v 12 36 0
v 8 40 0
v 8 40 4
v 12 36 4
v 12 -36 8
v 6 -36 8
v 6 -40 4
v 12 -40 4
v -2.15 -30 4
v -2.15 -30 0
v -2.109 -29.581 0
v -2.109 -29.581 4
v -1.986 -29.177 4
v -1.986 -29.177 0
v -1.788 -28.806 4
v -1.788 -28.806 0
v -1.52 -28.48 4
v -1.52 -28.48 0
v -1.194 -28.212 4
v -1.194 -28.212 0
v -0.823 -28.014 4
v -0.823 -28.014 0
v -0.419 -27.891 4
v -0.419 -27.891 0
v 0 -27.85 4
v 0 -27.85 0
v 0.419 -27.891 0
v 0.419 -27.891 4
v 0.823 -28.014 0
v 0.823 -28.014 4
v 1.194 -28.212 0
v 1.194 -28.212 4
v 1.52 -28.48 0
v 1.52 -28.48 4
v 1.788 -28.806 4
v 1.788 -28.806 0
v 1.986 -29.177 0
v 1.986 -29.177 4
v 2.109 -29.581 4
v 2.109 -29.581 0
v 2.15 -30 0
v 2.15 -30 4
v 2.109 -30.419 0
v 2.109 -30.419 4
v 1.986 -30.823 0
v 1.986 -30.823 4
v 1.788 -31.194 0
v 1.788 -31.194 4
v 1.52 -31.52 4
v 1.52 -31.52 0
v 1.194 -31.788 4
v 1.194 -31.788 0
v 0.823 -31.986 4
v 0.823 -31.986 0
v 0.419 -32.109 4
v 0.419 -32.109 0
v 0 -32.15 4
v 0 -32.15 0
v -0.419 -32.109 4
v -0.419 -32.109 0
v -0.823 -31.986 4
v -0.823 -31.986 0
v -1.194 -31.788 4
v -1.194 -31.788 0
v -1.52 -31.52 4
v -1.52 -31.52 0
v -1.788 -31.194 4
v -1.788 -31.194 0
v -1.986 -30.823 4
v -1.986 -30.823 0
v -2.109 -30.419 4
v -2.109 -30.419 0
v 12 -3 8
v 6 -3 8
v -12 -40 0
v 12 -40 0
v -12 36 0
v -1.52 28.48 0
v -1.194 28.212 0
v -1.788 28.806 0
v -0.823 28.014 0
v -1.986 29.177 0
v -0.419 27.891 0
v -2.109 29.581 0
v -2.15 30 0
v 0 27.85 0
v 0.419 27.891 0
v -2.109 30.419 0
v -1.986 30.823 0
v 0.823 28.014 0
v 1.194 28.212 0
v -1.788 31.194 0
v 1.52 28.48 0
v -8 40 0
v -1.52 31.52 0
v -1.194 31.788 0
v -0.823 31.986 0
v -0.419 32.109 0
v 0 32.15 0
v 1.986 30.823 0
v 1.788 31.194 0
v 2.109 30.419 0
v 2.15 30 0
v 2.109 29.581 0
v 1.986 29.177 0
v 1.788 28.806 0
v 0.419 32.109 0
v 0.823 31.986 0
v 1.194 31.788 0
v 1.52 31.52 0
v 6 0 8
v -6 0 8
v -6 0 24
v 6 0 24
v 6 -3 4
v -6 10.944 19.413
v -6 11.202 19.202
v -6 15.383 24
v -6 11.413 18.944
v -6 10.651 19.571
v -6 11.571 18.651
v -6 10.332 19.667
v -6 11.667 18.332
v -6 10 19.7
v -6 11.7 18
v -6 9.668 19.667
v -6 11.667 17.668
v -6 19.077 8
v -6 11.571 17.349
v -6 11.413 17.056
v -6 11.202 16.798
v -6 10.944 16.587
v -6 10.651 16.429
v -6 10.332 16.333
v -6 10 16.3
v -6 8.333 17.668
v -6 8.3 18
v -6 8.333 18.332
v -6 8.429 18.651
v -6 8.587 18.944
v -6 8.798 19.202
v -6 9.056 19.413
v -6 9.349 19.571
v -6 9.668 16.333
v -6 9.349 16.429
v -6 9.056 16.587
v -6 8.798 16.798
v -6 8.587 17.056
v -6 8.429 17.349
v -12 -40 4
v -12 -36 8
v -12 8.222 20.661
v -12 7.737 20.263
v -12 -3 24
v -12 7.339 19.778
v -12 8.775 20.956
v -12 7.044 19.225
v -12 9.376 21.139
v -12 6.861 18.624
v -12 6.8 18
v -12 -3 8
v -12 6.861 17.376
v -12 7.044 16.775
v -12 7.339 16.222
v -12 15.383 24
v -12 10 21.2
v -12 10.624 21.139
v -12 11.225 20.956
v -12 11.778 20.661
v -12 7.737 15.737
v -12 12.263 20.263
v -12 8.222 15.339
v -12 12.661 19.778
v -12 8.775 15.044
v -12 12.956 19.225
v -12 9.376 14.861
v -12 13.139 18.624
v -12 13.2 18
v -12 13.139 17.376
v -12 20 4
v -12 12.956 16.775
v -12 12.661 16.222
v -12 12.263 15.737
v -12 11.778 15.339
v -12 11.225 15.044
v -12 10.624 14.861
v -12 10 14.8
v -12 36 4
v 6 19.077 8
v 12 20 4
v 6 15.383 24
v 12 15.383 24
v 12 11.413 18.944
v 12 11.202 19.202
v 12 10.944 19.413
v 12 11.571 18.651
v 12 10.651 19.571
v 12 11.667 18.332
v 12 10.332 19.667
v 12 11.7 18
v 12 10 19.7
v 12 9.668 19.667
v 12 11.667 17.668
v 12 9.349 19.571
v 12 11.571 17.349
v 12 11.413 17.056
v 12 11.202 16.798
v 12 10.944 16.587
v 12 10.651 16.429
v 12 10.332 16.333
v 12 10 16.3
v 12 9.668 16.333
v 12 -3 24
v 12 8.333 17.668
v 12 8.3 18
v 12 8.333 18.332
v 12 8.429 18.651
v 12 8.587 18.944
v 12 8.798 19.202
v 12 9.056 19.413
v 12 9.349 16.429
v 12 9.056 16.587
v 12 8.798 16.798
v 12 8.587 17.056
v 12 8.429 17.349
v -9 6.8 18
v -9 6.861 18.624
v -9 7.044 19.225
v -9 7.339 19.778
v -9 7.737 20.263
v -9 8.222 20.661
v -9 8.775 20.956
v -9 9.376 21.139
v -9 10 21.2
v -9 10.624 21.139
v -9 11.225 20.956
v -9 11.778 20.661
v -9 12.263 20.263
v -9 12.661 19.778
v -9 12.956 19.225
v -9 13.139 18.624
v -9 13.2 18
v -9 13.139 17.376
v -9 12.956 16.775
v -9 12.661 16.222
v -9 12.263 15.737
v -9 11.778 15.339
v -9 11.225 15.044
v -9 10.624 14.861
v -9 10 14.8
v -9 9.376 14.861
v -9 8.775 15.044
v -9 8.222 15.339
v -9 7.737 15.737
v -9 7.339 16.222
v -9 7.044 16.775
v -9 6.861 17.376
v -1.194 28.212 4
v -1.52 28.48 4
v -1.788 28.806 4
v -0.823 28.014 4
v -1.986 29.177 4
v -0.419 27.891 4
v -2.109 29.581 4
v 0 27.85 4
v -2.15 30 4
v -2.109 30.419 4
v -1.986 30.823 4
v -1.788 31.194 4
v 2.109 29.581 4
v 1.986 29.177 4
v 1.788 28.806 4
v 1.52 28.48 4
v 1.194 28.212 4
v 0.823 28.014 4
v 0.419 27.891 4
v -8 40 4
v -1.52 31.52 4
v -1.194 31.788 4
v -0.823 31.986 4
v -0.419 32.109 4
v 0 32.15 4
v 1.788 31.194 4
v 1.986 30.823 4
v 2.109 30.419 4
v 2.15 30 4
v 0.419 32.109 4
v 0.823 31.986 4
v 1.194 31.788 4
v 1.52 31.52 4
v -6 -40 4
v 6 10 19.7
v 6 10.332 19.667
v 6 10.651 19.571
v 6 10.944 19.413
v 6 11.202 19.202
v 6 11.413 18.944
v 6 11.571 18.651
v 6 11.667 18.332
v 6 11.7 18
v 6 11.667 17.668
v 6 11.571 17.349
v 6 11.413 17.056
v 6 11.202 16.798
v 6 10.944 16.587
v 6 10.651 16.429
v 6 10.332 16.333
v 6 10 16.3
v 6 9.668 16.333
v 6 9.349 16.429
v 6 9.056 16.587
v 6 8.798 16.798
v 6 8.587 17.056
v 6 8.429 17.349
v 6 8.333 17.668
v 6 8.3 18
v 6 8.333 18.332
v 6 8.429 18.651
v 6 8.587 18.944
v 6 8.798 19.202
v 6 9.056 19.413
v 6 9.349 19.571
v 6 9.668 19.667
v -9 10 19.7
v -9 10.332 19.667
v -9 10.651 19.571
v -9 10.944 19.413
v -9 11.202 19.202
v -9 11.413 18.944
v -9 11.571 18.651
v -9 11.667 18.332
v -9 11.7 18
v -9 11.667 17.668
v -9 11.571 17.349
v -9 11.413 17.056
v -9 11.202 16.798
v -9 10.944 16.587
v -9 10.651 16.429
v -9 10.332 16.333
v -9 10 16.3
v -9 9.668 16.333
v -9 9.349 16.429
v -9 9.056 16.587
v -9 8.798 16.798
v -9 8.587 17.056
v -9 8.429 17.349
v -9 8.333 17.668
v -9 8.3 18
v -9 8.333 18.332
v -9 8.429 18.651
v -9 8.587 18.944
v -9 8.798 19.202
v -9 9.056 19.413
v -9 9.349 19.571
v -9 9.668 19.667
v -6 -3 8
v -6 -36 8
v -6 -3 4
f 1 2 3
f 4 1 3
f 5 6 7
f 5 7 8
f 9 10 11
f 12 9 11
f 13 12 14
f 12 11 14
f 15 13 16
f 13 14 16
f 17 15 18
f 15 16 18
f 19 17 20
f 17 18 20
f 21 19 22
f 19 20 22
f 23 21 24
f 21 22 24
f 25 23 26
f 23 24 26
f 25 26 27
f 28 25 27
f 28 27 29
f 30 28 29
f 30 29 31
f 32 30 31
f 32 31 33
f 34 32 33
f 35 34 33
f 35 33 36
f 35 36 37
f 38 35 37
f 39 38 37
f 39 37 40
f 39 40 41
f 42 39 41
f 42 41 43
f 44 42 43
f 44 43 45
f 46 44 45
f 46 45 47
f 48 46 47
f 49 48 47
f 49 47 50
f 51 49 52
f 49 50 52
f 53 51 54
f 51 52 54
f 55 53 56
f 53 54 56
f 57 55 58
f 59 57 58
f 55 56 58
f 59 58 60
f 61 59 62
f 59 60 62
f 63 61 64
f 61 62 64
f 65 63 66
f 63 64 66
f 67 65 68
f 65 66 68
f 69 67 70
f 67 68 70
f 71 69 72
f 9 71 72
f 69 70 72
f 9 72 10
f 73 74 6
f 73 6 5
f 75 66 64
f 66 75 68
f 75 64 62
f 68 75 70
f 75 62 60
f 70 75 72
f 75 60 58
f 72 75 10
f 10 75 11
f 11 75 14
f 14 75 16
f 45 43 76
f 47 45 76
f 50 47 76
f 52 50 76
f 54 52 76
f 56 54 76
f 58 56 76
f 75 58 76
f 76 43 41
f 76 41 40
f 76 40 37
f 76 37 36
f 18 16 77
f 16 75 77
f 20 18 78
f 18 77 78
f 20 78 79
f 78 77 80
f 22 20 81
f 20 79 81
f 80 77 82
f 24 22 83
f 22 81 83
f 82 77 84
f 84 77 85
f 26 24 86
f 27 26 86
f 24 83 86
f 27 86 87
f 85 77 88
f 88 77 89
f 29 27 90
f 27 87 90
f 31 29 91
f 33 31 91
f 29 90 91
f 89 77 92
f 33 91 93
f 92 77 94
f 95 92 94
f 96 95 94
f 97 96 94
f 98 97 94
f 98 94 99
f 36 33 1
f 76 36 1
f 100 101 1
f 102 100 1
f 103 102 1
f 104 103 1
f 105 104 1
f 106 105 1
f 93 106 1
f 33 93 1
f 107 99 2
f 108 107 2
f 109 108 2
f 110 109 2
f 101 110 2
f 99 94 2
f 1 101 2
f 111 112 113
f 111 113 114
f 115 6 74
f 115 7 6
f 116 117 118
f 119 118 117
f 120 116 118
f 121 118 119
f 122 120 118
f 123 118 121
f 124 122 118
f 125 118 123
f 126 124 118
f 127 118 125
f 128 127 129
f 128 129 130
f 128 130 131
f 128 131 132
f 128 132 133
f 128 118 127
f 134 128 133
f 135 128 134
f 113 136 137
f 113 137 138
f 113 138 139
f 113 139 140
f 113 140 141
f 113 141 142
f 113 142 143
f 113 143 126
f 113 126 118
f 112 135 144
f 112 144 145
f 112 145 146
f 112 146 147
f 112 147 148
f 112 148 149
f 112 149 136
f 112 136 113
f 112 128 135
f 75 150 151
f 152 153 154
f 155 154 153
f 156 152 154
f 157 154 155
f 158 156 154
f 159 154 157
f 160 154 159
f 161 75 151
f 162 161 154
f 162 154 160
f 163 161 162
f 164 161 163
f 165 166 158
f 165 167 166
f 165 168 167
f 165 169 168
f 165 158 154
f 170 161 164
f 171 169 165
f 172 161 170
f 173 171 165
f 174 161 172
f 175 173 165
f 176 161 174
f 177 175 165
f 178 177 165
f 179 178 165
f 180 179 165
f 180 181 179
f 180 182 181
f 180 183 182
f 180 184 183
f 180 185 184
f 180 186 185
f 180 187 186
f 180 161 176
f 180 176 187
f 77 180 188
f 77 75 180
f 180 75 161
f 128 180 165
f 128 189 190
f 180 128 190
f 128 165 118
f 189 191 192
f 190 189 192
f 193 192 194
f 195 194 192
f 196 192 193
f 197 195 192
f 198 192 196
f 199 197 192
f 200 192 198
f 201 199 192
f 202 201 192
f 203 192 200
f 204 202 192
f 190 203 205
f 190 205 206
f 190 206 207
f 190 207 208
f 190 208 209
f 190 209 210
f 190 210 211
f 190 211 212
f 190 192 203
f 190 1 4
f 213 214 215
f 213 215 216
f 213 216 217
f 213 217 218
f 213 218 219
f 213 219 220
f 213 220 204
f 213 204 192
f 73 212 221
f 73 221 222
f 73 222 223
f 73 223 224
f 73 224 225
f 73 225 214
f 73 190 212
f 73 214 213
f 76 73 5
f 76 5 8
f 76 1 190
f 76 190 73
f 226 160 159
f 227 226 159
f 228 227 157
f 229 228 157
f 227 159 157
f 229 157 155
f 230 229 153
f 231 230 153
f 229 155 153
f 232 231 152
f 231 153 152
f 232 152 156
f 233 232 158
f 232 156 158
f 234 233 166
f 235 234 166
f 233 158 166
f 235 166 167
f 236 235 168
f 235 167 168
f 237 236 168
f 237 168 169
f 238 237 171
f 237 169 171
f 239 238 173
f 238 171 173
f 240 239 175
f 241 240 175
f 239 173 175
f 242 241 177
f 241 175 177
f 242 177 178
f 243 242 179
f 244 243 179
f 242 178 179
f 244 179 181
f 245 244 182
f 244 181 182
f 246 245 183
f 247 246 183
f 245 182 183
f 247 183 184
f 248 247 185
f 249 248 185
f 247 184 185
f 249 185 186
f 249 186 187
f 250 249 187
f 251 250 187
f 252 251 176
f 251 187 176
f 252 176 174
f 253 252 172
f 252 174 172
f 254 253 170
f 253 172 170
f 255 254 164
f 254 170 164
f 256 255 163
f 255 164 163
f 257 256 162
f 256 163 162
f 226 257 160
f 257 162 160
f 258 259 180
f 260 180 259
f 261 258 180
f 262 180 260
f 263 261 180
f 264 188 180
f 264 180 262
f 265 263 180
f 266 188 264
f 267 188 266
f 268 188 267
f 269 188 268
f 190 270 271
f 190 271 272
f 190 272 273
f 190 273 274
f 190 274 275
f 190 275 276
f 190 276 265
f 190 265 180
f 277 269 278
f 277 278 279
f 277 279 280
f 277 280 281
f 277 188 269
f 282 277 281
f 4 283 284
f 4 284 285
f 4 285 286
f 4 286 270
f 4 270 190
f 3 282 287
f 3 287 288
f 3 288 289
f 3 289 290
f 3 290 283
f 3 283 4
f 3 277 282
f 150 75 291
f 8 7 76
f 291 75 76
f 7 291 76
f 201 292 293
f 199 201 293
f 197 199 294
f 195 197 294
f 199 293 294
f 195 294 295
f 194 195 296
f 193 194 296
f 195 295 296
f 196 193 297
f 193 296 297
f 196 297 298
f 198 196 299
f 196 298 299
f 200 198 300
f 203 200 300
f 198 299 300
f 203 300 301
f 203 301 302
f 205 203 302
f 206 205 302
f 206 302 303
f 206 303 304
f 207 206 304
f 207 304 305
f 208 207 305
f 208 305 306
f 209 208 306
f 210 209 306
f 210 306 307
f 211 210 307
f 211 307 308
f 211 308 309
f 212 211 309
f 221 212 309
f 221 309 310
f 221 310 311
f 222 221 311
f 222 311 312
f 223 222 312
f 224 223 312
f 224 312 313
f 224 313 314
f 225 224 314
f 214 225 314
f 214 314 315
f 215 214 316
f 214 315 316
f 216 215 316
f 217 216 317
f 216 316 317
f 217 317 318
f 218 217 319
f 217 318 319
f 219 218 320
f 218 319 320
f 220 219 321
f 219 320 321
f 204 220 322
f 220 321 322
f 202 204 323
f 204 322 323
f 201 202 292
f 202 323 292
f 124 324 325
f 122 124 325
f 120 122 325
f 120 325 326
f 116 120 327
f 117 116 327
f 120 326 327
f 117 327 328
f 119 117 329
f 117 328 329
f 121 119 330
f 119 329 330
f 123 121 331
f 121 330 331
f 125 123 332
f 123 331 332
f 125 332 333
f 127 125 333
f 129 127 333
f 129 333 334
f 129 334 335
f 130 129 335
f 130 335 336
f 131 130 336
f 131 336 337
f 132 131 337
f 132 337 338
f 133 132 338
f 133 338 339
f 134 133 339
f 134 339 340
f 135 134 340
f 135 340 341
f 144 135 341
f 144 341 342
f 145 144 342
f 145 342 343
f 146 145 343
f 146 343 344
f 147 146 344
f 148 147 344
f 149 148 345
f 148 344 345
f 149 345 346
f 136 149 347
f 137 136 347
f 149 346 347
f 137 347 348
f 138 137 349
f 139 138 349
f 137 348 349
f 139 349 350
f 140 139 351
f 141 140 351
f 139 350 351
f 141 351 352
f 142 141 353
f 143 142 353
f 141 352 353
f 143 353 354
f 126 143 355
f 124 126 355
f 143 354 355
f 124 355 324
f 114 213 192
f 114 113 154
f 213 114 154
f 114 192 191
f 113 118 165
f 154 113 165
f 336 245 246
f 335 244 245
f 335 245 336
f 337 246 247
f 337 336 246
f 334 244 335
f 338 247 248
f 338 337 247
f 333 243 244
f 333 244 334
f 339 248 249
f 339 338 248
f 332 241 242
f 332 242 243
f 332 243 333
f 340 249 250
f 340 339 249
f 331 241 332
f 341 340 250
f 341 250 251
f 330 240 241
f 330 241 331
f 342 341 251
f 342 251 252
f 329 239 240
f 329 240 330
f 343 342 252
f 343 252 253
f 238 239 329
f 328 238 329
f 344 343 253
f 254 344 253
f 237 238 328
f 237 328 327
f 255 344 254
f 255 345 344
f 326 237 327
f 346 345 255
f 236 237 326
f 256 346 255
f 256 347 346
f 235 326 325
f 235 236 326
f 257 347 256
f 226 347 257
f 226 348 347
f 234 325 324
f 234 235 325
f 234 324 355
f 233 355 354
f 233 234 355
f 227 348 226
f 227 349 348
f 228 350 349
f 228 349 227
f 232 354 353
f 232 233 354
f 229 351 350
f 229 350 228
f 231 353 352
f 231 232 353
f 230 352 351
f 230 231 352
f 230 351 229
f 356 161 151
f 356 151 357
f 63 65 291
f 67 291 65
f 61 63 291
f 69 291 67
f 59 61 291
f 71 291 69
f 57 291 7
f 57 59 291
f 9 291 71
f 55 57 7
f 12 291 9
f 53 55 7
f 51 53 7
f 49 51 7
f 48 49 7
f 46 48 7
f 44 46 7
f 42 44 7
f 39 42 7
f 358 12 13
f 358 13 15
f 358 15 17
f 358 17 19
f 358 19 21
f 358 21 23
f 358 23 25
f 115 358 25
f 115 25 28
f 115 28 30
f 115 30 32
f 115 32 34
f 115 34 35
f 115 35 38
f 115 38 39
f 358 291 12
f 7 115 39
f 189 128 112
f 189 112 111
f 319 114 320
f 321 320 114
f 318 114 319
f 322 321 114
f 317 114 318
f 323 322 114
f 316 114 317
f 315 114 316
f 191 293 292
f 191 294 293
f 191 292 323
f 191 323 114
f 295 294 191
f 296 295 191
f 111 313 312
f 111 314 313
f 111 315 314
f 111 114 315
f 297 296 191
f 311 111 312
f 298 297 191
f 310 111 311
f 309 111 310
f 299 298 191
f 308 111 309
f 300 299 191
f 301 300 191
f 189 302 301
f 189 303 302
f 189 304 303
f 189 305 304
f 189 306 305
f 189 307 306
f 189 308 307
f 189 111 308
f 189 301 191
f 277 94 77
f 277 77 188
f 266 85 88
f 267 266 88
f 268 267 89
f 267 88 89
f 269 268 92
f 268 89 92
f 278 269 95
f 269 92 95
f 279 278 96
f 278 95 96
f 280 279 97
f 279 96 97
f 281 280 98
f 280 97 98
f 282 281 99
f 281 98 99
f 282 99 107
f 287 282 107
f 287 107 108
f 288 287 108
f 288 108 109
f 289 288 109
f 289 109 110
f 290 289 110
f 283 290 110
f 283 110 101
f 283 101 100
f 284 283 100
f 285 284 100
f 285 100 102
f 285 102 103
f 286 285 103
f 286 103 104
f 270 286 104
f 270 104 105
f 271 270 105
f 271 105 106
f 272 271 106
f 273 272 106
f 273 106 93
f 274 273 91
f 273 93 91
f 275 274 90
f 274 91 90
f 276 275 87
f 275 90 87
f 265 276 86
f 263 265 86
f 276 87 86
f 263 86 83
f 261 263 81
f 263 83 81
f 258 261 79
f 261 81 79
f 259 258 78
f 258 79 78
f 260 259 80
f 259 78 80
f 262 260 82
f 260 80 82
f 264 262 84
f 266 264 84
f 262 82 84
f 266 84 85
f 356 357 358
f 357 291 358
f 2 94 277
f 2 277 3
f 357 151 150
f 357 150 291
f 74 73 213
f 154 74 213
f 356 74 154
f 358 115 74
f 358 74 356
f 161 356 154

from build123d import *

# Parameters (mm, degrees)
ESQUISSE1_W             = 24
ESQUISSE1_H             = 80
BOSS_EXTRU_1_DEPTH      = 4
ESQUISSE2_W             = 24
ESQUISSE2_H             = 23
BOSS_EXTRU_2_DEPTH      = 4
BOSS_EXTRU_3_DEPTH      = 16
ESQUISSE4_W             = 6
ESQUISSE4_H             = 37
BOSS_EXTRU_4_DEPTH      = 4
CHANFREIN1_SIZE         = 4
CHANFREIN2_SIZE2        = 4.617363823
CHANFREIN2_SIZE         = 20
D_GAGEMENT_M31_D        = 3.4
D_GAGEMENT_M42_D        = 4.3
ESQUISSE11_R            = 3.2
ENL_V_MAT_EXTRU_1_DEPTH = 3


with BuildPart() as part:
    # Esquisse1 → Boss.-Extru.1 (new body)
    with BuildSketch(Plane.XY):
        Rectangle(ESQUISSE1_W, ESQUISSE1_H)
    extrude(amount=BOSS_EXTRU_1_DEPTH)

    # Esquisse2 → Boss.-Extru.2 (add)
    with BuildSketch(Plane.XY.offset(4)):
        with Locations((0, 8.5)):
            Rectangle(ESQUISSE2_W, ESQUISSE2_H)
    extrude(amount=BOSS_EXTRU_2_DEPTH)

    # Esquisse3 → Boss.-Extru.3 (add)
    with BuildSketch(Plane.XY.offset(8)):
        Polygon((-6, 20), (-6, 0), (6, 0), (6, 20), (12, 20), (12, -3), (-12, -3), (-12, 20), align=None)
    extrude(amount=BOSS_EXTRU_3_DEPTH)

    # Esquisse4 → Boss.-Extru.4 (add)
    with BuildSketch(Plane.XY.offset(4)):
        with Locations((-9, -21.5)):
            Rectangle(ESQUISSE4_W, ESQUISSE4_H)
        with Locations((9, -21.5)):
            Rectangle(ESQUISSE4_W, ESQUISSE4_H)
    extrude(amount=BOSS_EXTRU_4_DEPTH)

    # Chanfrein1
    chanfrein1_edges = [part.edges().sort_by_distance(p)[0] for p in [
        (-9, -40, 8),
        (9, -40, 8),
        (12, 40, 2),
        (-12, 40, 2),
    ]]
    chamfer(chanfrein1_edges, length=CHANFREIN1_SIZE)

    # Chanfrein2
    chanfrein2_edges = [part.edges().sort_by_distance(p)[0] for p in [
        (-9, 20, 24),
    ]]
    chanfrein2_side = [part.faces().sort_by_distance(p)[0] for p in [
        (-9, 20, 23.907652724),
    ]]
    chamfer(chanfrein2_edges, length=CHANFREIN2_SIZE - 0.0001, length2=CHANFREIN2_SIZE2 - 0.0001, reference=chanfrein2_side[0])  # a hair under: the kernel refuses the full size

    # Dégagement M31 (through all)
    with Locations(Plane(origin=(12, 0, 0), x_dir=(0, 0, -1), z_dir=(1, 0, 0))):
        with Locations((-18, 10)):
            Hole(D_GAGEMENT_M31_D / 2)

    # Dégagement M42 (through all)
    with Locations(Plane.XY.offset(4)):
        with Locations((0, 30), (0, -30)):
            Hole(D_GAGEMENT_M42_D / 2)

    # Esquisse11 → Enlèv. mat.-Extru.1 (cut)
    with BuildSketch(Plane.ZY.offset(12)):
        with Locations(Location((18, 10, 0), (0, 0, 270))):
            Circle(ESQUISSE11_R)
    extrude(amount=-ENL_V_MAT_EXTRU_1_DEPTH, mode=Mode.SUBTRACT)


solid = part.part
